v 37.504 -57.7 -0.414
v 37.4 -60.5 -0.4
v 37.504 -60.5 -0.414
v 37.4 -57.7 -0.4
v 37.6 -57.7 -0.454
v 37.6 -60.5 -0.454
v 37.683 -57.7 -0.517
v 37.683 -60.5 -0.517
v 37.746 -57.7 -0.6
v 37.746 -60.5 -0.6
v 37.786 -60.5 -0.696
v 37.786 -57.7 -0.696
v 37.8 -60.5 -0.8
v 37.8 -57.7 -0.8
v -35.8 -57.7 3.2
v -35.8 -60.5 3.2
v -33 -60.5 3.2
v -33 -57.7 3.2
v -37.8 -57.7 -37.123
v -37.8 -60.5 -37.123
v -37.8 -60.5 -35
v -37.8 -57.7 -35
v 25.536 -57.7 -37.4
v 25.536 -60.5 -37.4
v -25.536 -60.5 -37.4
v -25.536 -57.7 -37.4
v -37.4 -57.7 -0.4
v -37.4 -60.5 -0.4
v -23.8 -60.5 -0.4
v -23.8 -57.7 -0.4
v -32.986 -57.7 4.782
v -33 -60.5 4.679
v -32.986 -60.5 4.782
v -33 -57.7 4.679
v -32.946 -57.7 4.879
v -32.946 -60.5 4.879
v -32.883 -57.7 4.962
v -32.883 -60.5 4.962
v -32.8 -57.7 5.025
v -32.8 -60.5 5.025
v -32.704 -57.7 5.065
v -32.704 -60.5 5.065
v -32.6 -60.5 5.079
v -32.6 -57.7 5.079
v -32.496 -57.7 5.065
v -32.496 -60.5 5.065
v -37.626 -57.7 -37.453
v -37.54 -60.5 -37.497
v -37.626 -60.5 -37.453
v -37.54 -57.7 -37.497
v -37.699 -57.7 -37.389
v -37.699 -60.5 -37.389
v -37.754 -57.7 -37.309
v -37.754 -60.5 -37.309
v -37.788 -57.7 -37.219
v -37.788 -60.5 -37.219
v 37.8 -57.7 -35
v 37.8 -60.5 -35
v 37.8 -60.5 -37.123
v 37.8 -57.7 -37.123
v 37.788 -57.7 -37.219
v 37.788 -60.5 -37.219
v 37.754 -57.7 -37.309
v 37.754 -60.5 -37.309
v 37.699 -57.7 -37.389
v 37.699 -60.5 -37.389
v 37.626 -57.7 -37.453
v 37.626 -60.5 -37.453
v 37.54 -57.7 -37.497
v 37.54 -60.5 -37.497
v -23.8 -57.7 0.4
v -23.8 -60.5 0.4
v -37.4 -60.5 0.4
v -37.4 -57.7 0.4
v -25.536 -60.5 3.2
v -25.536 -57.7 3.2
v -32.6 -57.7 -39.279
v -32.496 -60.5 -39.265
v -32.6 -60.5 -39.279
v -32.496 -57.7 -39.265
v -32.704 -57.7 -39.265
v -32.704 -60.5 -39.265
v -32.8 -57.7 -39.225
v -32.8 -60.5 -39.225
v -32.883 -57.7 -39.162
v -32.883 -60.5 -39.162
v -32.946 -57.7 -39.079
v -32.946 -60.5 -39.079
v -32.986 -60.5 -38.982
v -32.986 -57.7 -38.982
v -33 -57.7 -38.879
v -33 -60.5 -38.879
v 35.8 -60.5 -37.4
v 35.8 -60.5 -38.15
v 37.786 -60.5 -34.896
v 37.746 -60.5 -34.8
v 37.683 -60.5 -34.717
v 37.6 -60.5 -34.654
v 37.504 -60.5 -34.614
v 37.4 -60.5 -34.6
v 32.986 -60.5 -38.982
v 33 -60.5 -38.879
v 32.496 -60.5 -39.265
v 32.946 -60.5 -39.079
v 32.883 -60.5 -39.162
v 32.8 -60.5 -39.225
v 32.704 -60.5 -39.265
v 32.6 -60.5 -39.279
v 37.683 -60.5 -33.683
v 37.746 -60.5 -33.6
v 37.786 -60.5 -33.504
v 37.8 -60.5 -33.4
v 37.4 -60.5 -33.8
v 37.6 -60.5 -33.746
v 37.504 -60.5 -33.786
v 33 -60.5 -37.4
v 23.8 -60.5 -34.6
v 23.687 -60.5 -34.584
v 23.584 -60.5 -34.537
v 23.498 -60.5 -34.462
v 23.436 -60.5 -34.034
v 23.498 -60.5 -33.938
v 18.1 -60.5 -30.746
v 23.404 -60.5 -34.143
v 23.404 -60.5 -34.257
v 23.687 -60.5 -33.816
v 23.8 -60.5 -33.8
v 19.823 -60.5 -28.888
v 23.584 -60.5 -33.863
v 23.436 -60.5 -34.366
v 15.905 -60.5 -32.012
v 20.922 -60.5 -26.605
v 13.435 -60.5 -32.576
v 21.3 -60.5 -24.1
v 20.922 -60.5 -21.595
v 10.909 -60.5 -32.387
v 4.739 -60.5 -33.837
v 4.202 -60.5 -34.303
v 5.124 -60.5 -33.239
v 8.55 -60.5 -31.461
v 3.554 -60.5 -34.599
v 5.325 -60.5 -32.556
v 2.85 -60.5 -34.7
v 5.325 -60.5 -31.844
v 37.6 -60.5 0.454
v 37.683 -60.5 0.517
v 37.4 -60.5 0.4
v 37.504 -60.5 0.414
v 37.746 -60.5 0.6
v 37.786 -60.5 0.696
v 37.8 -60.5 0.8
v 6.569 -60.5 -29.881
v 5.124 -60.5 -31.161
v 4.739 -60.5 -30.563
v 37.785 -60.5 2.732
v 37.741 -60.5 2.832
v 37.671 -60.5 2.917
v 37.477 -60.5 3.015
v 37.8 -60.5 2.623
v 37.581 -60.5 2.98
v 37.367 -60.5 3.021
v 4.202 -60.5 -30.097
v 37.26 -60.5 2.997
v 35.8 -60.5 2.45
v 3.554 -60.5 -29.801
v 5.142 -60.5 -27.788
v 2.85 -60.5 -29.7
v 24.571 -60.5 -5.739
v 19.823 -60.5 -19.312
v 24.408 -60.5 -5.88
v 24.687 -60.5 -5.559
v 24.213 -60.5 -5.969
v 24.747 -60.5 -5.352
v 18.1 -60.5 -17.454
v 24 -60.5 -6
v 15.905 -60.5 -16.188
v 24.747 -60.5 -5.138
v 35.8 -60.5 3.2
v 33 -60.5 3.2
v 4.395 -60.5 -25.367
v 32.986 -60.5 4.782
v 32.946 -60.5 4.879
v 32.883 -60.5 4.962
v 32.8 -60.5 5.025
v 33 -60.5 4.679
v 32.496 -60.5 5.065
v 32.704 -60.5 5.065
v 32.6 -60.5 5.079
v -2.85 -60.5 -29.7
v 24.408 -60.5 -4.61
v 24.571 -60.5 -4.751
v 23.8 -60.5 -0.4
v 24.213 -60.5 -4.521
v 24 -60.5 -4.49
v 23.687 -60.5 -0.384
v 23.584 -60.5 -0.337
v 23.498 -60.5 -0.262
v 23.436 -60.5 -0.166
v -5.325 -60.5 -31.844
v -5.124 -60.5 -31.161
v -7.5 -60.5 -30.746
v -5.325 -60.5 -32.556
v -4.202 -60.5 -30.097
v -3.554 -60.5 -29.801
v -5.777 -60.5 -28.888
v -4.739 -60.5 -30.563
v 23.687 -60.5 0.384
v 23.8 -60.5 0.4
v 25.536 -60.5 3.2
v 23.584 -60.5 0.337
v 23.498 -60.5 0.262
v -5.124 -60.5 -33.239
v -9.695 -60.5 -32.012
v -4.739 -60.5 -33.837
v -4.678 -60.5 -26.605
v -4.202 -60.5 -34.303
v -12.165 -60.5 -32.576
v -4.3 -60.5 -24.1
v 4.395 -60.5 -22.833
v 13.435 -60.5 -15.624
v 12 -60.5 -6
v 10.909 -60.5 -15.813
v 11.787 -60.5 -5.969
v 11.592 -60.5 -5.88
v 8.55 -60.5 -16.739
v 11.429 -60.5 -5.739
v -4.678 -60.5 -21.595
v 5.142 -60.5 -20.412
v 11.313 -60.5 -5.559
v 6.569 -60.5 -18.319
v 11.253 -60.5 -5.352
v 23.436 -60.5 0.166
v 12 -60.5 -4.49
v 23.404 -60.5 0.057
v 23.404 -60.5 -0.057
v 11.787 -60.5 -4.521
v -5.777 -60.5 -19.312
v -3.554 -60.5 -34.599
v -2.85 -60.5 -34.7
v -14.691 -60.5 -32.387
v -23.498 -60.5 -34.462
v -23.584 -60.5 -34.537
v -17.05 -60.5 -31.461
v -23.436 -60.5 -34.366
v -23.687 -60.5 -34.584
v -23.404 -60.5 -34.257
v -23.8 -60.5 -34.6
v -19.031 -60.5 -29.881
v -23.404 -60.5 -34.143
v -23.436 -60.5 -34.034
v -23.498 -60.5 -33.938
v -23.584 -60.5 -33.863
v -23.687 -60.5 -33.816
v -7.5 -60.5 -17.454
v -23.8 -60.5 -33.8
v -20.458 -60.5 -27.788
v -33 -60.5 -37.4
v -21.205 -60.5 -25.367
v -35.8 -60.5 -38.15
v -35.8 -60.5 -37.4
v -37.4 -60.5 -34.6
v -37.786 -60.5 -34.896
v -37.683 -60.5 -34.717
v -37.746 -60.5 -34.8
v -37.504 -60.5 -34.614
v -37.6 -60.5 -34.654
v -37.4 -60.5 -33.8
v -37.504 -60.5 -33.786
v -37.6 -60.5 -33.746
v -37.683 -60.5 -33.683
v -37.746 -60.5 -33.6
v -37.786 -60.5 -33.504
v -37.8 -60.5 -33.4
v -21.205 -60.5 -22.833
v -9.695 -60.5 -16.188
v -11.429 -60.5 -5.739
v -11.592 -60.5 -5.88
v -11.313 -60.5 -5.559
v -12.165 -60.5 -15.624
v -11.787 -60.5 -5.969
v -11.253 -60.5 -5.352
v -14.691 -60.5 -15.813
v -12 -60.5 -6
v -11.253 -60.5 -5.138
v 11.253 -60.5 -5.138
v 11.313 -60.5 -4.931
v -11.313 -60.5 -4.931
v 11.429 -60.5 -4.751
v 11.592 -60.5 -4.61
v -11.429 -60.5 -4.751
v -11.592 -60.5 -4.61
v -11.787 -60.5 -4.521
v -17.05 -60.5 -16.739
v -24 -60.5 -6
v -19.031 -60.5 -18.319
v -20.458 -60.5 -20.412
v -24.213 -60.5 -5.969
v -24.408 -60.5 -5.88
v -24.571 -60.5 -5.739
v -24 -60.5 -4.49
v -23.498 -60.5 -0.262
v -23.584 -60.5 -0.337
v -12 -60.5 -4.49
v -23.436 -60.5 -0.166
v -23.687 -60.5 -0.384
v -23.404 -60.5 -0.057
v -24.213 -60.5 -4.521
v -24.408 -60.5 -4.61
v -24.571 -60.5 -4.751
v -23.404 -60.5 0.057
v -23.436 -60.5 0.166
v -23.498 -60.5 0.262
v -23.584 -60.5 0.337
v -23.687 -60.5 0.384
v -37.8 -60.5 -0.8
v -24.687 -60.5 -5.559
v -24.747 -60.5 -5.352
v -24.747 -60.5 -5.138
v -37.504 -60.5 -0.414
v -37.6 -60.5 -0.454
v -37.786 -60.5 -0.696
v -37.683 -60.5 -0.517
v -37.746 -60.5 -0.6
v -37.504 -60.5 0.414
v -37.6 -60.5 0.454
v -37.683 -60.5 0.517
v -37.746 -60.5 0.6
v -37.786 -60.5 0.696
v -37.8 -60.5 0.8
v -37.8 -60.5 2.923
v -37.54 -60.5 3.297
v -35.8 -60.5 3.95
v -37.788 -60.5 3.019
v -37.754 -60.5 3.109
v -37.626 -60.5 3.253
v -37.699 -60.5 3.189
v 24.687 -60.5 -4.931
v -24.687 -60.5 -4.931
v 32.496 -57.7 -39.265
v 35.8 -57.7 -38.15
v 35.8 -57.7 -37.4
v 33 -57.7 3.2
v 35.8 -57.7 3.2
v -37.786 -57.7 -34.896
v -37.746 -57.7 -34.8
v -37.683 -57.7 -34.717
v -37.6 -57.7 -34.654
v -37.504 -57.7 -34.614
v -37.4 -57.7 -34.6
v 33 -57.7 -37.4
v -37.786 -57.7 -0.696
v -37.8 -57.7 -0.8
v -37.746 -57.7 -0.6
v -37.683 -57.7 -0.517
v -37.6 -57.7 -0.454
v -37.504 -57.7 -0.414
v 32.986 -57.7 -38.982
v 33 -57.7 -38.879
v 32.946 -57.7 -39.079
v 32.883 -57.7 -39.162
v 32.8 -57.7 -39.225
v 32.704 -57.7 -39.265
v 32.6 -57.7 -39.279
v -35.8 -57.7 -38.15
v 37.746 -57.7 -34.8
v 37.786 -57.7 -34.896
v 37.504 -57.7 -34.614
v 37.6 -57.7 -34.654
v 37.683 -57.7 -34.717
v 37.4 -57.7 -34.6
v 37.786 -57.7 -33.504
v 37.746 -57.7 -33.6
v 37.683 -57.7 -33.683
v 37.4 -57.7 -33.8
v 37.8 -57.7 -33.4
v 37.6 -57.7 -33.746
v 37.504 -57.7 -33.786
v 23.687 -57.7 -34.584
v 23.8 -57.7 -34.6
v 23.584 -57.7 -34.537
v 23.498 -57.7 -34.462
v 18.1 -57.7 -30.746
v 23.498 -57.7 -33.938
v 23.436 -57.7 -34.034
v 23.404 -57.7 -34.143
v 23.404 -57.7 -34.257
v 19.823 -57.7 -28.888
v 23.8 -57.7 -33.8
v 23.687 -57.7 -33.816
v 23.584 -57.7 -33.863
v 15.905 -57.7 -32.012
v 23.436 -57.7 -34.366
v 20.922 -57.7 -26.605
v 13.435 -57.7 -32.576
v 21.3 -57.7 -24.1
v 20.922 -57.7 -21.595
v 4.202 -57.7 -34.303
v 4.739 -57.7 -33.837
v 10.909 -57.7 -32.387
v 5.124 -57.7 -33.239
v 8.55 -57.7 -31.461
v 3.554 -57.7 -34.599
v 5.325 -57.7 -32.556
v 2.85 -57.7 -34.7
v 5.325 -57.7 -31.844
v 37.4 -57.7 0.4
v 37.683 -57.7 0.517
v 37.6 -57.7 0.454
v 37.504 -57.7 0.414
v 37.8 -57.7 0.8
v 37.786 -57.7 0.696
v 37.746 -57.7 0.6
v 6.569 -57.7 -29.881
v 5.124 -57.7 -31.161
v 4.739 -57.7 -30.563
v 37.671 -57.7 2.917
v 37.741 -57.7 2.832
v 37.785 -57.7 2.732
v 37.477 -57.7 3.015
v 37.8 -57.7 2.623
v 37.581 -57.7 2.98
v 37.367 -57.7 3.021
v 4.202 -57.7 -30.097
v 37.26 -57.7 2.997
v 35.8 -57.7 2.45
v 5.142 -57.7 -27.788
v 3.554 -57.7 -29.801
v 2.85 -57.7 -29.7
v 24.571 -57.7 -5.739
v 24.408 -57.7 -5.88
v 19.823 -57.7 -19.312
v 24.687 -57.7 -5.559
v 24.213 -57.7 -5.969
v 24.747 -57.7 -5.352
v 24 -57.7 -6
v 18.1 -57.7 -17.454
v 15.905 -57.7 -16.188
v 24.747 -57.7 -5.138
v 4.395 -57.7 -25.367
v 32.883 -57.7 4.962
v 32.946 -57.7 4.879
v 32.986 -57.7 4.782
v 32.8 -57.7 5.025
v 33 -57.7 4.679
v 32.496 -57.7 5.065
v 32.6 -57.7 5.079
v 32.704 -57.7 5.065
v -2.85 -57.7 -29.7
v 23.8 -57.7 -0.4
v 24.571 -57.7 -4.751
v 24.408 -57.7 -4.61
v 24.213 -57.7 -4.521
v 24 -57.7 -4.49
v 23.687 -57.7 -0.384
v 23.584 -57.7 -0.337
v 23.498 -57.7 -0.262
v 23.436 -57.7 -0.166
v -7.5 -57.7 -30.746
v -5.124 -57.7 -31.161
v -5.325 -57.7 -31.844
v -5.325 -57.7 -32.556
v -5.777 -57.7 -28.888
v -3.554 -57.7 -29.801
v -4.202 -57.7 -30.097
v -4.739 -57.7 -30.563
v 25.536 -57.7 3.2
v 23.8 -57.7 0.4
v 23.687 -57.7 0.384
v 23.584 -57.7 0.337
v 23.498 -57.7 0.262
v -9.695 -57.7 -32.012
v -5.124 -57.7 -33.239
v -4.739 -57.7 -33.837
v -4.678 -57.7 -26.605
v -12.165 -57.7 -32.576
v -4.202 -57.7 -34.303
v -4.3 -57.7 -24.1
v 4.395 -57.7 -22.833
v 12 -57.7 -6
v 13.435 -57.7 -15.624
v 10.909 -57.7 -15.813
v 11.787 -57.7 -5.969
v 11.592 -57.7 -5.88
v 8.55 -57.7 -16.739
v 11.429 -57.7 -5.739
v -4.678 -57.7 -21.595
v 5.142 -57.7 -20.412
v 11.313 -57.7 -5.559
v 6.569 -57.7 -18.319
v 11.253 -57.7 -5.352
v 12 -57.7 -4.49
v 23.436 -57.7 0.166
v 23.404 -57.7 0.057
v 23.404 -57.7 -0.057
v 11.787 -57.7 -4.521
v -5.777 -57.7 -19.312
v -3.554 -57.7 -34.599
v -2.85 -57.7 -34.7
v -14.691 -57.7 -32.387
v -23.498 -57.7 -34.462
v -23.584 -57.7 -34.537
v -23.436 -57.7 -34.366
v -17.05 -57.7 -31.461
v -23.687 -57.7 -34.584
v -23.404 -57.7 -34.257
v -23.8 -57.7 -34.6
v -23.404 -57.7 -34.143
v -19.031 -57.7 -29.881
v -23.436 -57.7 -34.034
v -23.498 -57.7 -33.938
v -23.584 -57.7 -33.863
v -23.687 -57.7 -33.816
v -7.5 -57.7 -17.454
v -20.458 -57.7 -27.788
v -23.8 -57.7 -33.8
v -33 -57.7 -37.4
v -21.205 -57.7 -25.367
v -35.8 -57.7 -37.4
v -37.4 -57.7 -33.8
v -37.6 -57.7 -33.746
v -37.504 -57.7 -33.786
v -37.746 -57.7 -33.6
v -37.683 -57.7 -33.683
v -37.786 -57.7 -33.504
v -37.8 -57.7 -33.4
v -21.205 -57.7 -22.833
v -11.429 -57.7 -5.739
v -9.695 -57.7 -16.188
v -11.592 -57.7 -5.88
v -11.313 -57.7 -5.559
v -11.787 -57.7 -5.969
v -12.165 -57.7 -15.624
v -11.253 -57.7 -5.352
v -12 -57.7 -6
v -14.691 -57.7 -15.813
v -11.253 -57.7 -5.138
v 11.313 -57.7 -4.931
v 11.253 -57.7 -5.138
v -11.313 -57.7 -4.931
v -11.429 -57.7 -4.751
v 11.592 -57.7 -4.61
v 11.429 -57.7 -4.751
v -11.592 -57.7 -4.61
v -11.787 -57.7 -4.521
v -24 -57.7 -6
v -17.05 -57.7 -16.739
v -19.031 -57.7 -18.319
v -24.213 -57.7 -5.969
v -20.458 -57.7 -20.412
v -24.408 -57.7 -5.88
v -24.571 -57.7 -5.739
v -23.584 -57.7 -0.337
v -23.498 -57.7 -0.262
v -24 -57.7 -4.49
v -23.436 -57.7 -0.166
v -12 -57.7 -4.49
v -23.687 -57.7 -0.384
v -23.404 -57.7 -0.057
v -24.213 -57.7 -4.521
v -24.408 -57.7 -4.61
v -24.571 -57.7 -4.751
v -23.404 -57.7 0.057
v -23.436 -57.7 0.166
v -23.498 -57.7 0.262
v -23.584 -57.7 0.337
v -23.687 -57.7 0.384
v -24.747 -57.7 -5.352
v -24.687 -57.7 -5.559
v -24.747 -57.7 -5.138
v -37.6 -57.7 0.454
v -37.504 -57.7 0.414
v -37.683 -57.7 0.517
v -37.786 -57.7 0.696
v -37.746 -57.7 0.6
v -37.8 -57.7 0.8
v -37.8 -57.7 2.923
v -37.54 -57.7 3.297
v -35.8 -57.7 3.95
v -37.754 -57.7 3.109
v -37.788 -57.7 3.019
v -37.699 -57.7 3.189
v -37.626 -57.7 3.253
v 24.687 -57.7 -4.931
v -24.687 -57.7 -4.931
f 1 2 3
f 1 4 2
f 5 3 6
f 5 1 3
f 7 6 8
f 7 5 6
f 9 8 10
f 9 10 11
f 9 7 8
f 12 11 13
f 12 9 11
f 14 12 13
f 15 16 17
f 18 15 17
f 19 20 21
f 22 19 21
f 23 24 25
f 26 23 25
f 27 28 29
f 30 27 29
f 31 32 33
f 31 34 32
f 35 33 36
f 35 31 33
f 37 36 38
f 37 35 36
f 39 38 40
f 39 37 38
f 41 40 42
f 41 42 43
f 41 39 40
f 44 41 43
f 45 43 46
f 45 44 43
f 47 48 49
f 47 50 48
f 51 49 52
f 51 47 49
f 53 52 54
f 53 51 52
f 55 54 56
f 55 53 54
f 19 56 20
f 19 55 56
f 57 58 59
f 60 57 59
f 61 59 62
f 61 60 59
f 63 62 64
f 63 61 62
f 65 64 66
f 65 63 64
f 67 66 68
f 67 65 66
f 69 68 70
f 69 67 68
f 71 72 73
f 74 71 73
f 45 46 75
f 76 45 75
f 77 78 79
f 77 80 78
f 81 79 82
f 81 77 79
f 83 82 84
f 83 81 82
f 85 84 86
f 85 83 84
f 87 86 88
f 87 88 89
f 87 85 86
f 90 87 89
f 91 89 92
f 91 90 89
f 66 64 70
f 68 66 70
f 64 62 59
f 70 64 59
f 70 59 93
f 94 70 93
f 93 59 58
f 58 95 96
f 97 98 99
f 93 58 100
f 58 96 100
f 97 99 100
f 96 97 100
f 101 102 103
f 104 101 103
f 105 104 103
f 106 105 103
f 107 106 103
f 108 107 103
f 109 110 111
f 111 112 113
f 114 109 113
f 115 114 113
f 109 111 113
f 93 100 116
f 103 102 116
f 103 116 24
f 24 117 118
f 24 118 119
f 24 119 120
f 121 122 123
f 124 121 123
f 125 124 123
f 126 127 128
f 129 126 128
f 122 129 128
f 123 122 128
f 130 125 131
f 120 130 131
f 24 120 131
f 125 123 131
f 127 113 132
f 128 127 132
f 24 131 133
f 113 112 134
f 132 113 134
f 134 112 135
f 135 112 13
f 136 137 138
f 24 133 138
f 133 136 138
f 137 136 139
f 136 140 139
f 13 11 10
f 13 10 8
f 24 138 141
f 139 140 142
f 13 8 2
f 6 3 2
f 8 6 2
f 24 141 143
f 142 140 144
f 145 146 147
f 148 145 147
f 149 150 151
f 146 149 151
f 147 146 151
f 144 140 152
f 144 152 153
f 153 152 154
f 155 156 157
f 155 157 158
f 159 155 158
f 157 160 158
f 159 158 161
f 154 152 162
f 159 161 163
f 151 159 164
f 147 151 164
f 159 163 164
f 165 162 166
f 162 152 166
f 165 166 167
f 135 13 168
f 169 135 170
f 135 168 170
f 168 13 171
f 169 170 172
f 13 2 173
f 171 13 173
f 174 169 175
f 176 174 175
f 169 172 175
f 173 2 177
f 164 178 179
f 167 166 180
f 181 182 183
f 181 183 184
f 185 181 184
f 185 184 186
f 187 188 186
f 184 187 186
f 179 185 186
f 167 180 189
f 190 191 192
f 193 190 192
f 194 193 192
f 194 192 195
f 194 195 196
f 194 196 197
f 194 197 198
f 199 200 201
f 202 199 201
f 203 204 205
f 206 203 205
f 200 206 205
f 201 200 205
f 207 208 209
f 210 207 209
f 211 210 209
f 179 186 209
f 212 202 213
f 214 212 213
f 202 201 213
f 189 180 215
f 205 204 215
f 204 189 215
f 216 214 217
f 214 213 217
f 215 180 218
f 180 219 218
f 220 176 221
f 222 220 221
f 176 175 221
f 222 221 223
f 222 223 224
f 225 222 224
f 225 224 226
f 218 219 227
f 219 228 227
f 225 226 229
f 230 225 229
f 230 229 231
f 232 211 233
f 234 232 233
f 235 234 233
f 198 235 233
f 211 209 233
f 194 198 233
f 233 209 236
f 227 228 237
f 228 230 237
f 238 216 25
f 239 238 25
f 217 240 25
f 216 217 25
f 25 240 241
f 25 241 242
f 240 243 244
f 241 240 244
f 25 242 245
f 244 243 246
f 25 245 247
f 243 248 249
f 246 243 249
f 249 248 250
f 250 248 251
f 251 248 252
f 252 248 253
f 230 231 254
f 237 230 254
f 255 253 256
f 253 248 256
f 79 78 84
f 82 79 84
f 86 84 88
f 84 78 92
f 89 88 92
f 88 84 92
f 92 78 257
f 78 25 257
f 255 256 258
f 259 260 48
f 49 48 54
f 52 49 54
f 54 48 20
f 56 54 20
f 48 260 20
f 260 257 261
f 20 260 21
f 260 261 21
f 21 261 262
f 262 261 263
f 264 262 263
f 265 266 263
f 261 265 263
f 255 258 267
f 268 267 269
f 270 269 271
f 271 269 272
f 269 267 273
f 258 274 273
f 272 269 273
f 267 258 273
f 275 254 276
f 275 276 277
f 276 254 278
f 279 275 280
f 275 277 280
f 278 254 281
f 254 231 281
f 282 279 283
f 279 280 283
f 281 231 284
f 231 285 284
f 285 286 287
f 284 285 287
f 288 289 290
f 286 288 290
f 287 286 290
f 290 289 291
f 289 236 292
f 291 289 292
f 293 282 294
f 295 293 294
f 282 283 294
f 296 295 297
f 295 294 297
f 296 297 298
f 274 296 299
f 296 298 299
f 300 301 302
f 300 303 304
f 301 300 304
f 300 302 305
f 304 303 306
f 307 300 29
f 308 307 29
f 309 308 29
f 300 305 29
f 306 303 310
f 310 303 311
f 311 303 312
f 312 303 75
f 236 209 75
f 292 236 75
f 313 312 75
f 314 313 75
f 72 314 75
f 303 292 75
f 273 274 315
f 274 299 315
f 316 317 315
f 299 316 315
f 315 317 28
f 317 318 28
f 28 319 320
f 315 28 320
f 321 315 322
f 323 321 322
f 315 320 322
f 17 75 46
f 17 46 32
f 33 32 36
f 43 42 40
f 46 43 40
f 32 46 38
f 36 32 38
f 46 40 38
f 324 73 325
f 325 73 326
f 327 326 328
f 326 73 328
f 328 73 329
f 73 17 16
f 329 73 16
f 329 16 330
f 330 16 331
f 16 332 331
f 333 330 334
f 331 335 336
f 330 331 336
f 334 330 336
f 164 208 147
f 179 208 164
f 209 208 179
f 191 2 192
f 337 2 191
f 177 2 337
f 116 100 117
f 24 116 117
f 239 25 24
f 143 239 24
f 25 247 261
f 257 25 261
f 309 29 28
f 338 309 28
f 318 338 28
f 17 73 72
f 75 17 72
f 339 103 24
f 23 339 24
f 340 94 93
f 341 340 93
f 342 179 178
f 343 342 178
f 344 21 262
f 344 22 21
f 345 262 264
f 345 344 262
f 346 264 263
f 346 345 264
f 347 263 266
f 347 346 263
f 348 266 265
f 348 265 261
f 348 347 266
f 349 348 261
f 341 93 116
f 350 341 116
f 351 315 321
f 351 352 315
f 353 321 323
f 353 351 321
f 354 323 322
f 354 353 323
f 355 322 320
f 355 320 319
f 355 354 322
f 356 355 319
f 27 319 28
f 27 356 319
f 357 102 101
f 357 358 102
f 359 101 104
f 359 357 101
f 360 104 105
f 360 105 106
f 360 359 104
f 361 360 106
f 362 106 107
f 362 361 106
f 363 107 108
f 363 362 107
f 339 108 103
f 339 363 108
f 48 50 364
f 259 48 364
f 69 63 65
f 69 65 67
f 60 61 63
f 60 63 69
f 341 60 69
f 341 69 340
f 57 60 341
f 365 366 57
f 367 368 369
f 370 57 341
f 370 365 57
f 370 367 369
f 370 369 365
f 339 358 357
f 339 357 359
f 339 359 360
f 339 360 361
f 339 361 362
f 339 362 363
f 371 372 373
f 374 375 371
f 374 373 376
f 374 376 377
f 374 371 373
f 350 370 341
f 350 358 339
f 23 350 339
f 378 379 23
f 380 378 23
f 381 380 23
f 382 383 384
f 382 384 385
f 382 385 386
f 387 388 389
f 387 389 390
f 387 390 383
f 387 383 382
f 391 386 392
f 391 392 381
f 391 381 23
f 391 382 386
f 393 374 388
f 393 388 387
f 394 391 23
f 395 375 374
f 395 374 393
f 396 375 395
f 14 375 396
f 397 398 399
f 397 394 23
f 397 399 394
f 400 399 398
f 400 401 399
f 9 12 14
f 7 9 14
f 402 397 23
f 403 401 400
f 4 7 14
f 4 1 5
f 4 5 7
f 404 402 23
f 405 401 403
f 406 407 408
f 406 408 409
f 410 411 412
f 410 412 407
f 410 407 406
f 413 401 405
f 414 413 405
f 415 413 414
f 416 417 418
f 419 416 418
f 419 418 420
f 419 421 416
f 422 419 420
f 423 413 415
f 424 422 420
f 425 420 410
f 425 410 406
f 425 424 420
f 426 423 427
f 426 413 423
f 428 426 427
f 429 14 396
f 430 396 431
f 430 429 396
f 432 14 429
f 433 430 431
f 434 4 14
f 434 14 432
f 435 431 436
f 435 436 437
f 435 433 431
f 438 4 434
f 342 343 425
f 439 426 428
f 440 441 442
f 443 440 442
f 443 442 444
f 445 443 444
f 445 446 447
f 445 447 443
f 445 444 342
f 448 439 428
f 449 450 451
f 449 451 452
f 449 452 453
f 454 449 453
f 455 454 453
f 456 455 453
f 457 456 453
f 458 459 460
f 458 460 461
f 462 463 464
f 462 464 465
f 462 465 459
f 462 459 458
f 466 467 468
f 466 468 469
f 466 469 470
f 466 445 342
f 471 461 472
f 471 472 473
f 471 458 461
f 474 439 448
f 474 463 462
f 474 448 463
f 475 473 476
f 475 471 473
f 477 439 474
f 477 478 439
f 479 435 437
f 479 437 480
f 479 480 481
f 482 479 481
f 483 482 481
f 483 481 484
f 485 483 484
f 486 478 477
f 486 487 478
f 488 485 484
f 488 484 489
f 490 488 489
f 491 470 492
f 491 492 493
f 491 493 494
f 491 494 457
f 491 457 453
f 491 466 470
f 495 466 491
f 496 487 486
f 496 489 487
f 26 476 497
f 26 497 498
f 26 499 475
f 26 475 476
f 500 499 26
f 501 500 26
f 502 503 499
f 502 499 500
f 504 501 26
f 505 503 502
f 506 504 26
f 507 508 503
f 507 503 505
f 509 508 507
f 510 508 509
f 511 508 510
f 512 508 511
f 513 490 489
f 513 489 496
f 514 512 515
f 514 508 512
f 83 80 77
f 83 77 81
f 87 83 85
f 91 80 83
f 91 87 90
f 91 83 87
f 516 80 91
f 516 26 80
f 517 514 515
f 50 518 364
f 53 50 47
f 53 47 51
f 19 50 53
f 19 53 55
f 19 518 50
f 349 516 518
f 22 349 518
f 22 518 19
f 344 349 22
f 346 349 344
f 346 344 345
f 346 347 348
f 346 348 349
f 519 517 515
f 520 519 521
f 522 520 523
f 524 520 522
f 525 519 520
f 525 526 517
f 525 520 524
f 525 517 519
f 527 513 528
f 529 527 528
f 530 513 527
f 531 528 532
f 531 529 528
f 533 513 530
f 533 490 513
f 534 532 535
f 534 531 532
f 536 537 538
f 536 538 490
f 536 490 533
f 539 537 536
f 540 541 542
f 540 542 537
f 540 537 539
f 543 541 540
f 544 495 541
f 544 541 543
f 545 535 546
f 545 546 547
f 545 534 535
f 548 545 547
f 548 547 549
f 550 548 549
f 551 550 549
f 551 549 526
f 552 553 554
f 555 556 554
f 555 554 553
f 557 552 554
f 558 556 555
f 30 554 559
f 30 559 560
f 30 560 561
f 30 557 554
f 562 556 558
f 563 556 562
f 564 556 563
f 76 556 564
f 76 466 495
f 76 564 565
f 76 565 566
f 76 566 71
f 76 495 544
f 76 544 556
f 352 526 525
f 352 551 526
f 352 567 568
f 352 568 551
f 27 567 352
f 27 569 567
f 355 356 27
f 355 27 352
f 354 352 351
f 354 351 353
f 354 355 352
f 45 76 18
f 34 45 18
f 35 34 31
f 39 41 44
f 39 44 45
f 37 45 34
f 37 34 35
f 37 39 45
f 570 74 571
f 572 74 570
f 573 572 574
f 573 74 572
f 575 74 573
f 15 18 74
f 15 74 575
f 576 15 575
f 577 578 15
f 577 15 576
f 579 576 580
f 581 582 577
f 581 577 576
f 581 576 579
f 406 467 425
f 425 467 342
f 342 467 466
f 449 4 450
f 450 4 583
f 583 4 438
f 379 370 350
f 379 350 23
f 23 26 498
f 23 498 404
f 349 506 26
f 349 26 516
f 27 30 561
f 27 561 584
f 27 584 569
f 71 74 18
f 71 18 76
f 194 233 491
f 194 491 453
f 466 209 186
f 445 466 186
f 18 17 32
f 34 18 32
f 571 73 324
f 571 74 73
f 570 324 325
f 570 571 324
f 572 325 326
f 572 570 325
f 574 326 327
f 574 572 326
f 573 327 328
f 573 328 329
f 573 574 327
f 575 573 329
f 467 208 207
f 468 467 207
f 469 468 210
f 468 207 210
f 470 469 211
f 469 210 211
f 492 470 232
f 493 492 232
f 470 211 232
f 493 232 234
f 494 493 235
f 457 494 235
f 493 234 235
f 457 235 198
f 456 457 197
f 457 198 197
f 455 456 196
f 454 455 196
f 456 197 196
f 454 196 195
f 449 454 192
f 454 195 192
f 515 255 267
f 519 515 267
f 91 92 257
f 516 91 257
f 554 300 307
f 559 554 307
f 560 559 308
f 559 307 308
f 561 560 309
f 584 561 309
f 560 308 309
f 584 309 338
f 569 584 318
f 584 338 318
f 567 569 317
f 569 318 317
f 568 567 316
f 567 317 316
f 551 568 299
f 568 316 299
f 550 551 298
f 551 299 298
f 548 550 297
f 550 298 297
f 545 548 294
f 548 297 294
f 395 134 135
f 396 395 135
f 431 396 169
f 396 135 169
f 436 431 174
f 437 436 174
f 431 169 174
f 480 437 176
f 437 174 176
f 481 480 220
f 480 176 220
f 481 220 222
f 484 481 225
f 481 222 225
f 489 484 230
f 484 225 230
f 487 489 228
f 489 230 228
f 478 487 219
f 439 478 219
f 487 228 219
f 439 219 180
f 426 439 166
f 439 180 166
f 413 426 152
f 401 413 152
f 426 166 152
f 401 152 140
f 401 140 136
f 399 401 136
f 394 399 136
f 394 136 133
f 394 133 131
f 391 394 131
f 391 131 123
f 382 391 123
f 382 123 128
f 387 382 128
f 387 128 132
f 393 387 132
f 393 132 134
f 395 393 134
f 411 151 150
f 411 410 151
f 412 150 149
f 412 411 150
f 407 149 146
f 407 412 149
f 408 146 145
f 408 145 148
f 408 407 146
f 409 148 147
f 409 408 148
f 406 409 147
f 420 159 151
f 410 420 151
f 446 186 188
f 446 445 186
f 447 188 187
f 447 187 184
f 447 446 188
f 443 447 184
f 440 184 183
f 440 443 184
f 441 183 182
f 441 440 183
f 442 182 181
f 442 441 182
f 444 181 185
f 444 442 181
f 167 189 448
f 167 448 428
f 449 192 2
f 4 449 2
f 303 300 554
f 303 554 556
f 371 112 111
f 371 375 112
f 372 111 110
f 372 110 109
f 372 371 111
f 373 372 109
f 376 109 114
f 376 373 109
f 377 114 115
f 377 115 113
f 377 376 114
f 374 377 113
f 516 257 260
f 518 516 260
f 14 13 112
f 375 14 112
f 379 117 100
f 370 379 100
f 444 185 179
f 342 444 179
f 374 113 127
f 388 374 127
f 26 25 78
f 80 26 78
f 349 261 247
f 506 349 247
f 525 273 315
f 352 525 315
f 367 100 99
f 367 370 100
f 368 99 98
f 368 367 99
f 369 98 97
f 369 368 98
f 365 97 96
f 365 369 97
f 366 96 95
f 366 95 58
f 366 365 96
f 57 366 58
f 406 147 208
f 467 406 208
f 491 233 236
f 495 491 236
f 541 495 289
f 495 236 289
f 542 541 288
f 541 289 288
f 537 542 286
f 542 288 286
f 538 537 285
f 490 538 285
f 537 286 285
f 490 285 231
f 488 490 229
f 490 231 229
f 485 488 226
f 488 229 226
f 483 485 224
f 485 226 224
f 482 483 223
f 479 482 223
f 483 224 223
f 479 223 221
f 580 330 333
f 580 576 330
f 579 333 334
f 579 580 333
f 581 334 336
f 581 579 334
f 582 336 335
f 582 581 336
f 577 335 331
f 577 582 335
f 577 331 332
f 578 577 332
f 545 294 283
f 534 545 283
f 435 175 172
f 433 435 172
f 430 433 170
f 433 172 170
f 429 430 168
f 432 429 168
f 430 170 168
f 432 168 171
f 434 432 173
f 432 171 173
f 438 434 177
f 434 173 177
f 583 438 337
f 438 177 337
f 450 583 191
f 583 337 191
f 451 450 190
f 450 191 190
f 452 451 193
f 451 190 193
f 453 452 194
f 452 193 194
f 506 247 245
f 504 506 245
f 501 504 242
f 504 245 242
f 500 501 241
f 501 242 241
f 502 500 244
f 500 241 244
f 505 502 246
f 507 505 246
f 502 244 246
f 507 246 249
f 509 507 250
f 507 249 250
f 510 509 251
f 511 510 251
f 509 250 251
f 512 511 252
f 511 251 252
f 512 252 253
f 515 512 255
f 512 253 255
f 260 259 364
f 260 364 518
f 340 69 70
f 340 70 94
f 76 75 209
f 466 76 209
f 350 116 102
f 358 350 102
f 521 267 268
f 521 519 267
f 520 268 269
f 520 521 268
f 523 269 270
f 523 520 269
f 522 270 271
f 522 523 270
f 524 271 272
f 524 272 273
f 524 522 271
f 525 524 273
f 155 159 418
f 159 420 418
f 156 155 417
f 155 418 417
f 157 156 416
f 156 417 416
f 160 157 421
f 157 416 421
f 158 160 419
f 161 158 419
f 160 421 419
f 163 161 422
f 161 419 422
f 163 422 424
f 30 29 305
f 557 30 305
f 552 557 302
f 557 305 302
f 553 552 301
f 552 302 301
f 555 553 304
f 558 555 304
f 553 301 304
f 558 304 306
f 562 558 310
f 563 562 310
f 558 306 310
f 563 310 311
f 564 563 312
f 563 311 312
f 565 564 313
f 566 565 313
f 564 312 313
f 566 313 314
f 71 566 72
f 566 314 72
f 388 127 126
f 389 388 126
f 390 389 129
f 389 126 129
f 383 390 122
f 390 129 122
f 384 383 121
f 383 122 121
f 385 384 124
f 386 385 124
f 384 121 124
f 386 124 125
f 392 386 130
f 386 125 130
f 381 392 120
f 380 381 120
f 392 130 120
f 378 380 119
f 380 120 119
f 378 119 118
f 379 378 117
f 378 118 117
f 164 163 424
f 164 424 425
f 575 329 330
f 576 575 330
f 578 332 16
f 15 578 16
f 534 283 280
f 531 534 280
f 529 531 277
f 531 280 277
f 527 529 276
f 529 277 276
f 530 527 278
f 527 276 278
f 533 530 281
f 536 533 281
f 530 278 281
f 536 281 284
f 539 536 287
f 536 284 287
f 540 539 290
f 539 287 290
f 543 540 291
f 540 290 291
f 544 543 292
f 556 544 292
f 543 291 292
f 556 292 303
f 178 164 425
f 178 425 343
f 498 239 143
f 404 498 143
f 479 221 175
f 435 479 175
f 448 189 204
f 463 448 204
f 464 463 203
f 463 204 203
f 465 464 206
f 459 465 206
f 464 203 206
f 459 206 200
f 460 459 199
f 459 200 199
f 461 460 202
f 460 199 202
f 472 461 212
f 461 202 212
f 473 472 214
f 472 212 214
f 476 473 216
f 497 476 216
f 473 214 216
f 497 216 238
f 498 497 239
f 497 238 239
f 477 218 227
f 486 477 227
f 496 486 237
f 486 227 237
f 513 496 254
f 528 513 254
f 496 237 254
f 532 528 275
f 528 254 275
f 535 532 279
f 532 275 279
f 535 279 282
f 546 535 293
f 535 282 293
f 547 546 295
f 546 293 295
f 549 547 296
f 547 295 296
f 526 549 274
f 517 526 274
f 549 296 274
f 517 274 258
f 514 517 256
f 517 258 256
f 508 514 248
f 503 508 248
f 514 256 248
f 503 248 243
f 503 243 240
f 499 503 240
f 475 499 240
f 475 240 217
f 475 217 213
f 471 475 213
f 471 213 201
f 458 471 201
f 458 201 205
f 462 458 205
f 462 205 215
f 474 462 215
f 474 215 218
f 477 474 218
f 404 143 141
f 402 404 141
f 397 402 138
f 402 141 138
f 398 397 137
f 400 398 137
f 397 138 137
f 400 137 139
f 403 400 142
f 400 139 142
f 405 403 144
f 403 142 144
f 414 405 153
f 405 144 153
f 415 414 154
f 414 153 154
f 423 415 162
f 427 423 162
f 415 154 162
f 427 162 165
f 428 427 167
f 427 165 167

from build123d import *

# Parameters (mm, degrees)
PAD009_DEPTH    = 2.8
FILLET004_R     = 0.4
POCKET014_DEPTH = 2.801
SKETCH028_R     = 8.5
POCKET017_DEPTH = 2.801


with BuildPart() as part:
    # Sketch009 (on Face6 of ShapeBinder008) → Pad009 (new body)
    with BuildSketch(Plane.XZ.offset(60.5)):
        with BuildLine():
            Line((37.8, 3.2), (37.8, 0.4))
            Line((37.8, 0.4), (23.8, 0.4))
            ThreePointArc((23.8, 0.4), (23.4, 0), (23.8, -0.4))
            Line((23.8, -0.4), (37.8, -0.4))
            Line((37.8, -0.4), (37.8, -33.8))
            Line((37.8, -33.8), (23.8, -33.8))
            ThreePointArc((23.8, -33.8), (23.4, -34.2), (23.8, -34.6))
            Line((23.8, -34.6), (37.8, -34.6))
            Line((37.8, -34.6), (37.8, -37.4))
            Line((37.8, -37.4), (35.8, -38.15))
            Line((35.8, -38.15), (35.8, -37.4))
            Line((35.8, -37.4), (33, -37.4))
            Line((33, -37.4), (33, -39.4))
            Line((33, -39.4), (25.535898, -37.4))
            Line((25.535898, -37.4), (-25.535898, -37.4))
            Line((-25.535898, -37.4), (-33, -39.4))
            Line((-33, -39.4), (-33, -37.4))
            Line((-33, -37.4), (-35.8, -37.4))
            Line((-35.8, -38.15), (-35.8, -37.4))
            Line((-37.8, -37.4), (-35.8, -38.15))
            Line((-37.8, -37.4), (-37.8, -34.6))
            Line((-37.8, -34.6), (-23.8, -34.6))
            ThreePointArc((-23.8, -34.6), (-23.4, -34.2), (-23.8, -33.8))
            Line((-23.8, -33.8), (-37.8, -33.8))
            Line((-37.8, -33.8), (-37.8, -0.4))
            Line((-37.8, -0.4), (-23.8, -0.4))
            ThreePointArc((-23.8, -0.4), (-23.4, 0), (-23.8, 0.4))
            Line((-23.8, 0.4), (-37.8, 0.4))
            Line((-37.8, 0.4), (-37.8, 3.2))
            Line((-37.8, 3.2), (-35.8, 3.95))
            Line((-35.8, 3.95), (-35.8, 3.2))
            Line((-35.8, 3.2), (-33, 3.2))
            Line((-33, 3.2), (-33, 5.2))
            Line((-33, 5.2), (-25.535898, 3.2))
            Line((-25.535898, 3.2), (25.535898, 3.2))
            Line((25.535898, 3.2), (33, 5.2))
            Line((33, 5.2), (33, 3.2))
            Line((33, 3.2), (35.8, 3.2))
            Line((35.8, 2.45), (35.8, 3.2))
            Line((37.8, 3.2), (35.8, 2.45))
        make_face()
    extrude(amount=-PAD009_DEPTH)

    # Fillet004
    fillet004_edges = [part.edges().sort_by_distance(p)[0] for p in [
        (33, -59.1, 5.2),
        (37.8, -59.1, 3.2),
        (37.8, -59.1, 0.4),
        (37.8, -59.1, -0.4),
        (37.8, -59.1, -33.8),
        (37.8, -59.1, -34.6),
        (37.8, -59.1, -37.4),
        (33, -59.1, -39.4),
        (-37.8, -59.1, -33.8),
        (-37.8, -59.1, -34.6),
        (-37.8, -59.1, -37.4),
        (-33, -59.1, -39.4),
        (-33, -59.1, 5.2),
        (-37.8, -59.1, 3.2),
        (-37.8, -59.1, 0.4),
        (-37.8, -59.1, -0.4),
    ]]
    fillet(fillet004_edges, radius=FILLET004_R)

    # Sketch025 (on Face2 of Fillet004) → Pocket014 (cut, through all)
    with BuildSketch(Plane.XZ.offset(60.5)):
        with BuildLine():
            ThreePointArc((-24, -4.49), (-24.755, -5.245), (-24, -6))
            Line((-24, -6), (-12, -6))
            ThreePointArc((-12, -6), (-11.245, -5.245), (-12, -4.49))
            Line((-24, -4.49), (-12, -4.49))
        make_face()
        with BuildLine():
            ThreePointArc((12, -4.49), (11.245, -5.245), (12, -6))
            Line((12, -6), (24, -6))
            ThreePointArc((24, -6), (24.755, -5.245), (24, -4.49))
            Line((12, -4.49), (24, -4.49))
        make_face()
    extrude(amount=-POCKET014_DEPTH, mode=Mode.SUBTRACT)

    # Sketch028 (on Face2 of Pocket014) → Pocket017 (cut, through all)
    with BuildSketch(Plane.XZ.offset(60.5)):
        with Locations((-12.8, -24.1)):
            Circle(SKETCH028_R)
        with Locations((12.8, -24.1)):
            Circle(SKETCH028_R)
        with BuildLine():
            ThreePointArc((-2.85, -29.7), (-5.35, -32.2), (-2.85, -34.7))
            Line((-2.85, -34.7), (2.85, -34.7))
            ThreePointArc((2.85, -34.7), (5.35, -32.2), (2.85, -29.7))
            Line((-2.85, -29.7), (2.85, -29.7))
        make_face()
    extrude(amount=-POCKET017_DEPTH, mode=Mode.SUBTRACT)


solid = part.part
